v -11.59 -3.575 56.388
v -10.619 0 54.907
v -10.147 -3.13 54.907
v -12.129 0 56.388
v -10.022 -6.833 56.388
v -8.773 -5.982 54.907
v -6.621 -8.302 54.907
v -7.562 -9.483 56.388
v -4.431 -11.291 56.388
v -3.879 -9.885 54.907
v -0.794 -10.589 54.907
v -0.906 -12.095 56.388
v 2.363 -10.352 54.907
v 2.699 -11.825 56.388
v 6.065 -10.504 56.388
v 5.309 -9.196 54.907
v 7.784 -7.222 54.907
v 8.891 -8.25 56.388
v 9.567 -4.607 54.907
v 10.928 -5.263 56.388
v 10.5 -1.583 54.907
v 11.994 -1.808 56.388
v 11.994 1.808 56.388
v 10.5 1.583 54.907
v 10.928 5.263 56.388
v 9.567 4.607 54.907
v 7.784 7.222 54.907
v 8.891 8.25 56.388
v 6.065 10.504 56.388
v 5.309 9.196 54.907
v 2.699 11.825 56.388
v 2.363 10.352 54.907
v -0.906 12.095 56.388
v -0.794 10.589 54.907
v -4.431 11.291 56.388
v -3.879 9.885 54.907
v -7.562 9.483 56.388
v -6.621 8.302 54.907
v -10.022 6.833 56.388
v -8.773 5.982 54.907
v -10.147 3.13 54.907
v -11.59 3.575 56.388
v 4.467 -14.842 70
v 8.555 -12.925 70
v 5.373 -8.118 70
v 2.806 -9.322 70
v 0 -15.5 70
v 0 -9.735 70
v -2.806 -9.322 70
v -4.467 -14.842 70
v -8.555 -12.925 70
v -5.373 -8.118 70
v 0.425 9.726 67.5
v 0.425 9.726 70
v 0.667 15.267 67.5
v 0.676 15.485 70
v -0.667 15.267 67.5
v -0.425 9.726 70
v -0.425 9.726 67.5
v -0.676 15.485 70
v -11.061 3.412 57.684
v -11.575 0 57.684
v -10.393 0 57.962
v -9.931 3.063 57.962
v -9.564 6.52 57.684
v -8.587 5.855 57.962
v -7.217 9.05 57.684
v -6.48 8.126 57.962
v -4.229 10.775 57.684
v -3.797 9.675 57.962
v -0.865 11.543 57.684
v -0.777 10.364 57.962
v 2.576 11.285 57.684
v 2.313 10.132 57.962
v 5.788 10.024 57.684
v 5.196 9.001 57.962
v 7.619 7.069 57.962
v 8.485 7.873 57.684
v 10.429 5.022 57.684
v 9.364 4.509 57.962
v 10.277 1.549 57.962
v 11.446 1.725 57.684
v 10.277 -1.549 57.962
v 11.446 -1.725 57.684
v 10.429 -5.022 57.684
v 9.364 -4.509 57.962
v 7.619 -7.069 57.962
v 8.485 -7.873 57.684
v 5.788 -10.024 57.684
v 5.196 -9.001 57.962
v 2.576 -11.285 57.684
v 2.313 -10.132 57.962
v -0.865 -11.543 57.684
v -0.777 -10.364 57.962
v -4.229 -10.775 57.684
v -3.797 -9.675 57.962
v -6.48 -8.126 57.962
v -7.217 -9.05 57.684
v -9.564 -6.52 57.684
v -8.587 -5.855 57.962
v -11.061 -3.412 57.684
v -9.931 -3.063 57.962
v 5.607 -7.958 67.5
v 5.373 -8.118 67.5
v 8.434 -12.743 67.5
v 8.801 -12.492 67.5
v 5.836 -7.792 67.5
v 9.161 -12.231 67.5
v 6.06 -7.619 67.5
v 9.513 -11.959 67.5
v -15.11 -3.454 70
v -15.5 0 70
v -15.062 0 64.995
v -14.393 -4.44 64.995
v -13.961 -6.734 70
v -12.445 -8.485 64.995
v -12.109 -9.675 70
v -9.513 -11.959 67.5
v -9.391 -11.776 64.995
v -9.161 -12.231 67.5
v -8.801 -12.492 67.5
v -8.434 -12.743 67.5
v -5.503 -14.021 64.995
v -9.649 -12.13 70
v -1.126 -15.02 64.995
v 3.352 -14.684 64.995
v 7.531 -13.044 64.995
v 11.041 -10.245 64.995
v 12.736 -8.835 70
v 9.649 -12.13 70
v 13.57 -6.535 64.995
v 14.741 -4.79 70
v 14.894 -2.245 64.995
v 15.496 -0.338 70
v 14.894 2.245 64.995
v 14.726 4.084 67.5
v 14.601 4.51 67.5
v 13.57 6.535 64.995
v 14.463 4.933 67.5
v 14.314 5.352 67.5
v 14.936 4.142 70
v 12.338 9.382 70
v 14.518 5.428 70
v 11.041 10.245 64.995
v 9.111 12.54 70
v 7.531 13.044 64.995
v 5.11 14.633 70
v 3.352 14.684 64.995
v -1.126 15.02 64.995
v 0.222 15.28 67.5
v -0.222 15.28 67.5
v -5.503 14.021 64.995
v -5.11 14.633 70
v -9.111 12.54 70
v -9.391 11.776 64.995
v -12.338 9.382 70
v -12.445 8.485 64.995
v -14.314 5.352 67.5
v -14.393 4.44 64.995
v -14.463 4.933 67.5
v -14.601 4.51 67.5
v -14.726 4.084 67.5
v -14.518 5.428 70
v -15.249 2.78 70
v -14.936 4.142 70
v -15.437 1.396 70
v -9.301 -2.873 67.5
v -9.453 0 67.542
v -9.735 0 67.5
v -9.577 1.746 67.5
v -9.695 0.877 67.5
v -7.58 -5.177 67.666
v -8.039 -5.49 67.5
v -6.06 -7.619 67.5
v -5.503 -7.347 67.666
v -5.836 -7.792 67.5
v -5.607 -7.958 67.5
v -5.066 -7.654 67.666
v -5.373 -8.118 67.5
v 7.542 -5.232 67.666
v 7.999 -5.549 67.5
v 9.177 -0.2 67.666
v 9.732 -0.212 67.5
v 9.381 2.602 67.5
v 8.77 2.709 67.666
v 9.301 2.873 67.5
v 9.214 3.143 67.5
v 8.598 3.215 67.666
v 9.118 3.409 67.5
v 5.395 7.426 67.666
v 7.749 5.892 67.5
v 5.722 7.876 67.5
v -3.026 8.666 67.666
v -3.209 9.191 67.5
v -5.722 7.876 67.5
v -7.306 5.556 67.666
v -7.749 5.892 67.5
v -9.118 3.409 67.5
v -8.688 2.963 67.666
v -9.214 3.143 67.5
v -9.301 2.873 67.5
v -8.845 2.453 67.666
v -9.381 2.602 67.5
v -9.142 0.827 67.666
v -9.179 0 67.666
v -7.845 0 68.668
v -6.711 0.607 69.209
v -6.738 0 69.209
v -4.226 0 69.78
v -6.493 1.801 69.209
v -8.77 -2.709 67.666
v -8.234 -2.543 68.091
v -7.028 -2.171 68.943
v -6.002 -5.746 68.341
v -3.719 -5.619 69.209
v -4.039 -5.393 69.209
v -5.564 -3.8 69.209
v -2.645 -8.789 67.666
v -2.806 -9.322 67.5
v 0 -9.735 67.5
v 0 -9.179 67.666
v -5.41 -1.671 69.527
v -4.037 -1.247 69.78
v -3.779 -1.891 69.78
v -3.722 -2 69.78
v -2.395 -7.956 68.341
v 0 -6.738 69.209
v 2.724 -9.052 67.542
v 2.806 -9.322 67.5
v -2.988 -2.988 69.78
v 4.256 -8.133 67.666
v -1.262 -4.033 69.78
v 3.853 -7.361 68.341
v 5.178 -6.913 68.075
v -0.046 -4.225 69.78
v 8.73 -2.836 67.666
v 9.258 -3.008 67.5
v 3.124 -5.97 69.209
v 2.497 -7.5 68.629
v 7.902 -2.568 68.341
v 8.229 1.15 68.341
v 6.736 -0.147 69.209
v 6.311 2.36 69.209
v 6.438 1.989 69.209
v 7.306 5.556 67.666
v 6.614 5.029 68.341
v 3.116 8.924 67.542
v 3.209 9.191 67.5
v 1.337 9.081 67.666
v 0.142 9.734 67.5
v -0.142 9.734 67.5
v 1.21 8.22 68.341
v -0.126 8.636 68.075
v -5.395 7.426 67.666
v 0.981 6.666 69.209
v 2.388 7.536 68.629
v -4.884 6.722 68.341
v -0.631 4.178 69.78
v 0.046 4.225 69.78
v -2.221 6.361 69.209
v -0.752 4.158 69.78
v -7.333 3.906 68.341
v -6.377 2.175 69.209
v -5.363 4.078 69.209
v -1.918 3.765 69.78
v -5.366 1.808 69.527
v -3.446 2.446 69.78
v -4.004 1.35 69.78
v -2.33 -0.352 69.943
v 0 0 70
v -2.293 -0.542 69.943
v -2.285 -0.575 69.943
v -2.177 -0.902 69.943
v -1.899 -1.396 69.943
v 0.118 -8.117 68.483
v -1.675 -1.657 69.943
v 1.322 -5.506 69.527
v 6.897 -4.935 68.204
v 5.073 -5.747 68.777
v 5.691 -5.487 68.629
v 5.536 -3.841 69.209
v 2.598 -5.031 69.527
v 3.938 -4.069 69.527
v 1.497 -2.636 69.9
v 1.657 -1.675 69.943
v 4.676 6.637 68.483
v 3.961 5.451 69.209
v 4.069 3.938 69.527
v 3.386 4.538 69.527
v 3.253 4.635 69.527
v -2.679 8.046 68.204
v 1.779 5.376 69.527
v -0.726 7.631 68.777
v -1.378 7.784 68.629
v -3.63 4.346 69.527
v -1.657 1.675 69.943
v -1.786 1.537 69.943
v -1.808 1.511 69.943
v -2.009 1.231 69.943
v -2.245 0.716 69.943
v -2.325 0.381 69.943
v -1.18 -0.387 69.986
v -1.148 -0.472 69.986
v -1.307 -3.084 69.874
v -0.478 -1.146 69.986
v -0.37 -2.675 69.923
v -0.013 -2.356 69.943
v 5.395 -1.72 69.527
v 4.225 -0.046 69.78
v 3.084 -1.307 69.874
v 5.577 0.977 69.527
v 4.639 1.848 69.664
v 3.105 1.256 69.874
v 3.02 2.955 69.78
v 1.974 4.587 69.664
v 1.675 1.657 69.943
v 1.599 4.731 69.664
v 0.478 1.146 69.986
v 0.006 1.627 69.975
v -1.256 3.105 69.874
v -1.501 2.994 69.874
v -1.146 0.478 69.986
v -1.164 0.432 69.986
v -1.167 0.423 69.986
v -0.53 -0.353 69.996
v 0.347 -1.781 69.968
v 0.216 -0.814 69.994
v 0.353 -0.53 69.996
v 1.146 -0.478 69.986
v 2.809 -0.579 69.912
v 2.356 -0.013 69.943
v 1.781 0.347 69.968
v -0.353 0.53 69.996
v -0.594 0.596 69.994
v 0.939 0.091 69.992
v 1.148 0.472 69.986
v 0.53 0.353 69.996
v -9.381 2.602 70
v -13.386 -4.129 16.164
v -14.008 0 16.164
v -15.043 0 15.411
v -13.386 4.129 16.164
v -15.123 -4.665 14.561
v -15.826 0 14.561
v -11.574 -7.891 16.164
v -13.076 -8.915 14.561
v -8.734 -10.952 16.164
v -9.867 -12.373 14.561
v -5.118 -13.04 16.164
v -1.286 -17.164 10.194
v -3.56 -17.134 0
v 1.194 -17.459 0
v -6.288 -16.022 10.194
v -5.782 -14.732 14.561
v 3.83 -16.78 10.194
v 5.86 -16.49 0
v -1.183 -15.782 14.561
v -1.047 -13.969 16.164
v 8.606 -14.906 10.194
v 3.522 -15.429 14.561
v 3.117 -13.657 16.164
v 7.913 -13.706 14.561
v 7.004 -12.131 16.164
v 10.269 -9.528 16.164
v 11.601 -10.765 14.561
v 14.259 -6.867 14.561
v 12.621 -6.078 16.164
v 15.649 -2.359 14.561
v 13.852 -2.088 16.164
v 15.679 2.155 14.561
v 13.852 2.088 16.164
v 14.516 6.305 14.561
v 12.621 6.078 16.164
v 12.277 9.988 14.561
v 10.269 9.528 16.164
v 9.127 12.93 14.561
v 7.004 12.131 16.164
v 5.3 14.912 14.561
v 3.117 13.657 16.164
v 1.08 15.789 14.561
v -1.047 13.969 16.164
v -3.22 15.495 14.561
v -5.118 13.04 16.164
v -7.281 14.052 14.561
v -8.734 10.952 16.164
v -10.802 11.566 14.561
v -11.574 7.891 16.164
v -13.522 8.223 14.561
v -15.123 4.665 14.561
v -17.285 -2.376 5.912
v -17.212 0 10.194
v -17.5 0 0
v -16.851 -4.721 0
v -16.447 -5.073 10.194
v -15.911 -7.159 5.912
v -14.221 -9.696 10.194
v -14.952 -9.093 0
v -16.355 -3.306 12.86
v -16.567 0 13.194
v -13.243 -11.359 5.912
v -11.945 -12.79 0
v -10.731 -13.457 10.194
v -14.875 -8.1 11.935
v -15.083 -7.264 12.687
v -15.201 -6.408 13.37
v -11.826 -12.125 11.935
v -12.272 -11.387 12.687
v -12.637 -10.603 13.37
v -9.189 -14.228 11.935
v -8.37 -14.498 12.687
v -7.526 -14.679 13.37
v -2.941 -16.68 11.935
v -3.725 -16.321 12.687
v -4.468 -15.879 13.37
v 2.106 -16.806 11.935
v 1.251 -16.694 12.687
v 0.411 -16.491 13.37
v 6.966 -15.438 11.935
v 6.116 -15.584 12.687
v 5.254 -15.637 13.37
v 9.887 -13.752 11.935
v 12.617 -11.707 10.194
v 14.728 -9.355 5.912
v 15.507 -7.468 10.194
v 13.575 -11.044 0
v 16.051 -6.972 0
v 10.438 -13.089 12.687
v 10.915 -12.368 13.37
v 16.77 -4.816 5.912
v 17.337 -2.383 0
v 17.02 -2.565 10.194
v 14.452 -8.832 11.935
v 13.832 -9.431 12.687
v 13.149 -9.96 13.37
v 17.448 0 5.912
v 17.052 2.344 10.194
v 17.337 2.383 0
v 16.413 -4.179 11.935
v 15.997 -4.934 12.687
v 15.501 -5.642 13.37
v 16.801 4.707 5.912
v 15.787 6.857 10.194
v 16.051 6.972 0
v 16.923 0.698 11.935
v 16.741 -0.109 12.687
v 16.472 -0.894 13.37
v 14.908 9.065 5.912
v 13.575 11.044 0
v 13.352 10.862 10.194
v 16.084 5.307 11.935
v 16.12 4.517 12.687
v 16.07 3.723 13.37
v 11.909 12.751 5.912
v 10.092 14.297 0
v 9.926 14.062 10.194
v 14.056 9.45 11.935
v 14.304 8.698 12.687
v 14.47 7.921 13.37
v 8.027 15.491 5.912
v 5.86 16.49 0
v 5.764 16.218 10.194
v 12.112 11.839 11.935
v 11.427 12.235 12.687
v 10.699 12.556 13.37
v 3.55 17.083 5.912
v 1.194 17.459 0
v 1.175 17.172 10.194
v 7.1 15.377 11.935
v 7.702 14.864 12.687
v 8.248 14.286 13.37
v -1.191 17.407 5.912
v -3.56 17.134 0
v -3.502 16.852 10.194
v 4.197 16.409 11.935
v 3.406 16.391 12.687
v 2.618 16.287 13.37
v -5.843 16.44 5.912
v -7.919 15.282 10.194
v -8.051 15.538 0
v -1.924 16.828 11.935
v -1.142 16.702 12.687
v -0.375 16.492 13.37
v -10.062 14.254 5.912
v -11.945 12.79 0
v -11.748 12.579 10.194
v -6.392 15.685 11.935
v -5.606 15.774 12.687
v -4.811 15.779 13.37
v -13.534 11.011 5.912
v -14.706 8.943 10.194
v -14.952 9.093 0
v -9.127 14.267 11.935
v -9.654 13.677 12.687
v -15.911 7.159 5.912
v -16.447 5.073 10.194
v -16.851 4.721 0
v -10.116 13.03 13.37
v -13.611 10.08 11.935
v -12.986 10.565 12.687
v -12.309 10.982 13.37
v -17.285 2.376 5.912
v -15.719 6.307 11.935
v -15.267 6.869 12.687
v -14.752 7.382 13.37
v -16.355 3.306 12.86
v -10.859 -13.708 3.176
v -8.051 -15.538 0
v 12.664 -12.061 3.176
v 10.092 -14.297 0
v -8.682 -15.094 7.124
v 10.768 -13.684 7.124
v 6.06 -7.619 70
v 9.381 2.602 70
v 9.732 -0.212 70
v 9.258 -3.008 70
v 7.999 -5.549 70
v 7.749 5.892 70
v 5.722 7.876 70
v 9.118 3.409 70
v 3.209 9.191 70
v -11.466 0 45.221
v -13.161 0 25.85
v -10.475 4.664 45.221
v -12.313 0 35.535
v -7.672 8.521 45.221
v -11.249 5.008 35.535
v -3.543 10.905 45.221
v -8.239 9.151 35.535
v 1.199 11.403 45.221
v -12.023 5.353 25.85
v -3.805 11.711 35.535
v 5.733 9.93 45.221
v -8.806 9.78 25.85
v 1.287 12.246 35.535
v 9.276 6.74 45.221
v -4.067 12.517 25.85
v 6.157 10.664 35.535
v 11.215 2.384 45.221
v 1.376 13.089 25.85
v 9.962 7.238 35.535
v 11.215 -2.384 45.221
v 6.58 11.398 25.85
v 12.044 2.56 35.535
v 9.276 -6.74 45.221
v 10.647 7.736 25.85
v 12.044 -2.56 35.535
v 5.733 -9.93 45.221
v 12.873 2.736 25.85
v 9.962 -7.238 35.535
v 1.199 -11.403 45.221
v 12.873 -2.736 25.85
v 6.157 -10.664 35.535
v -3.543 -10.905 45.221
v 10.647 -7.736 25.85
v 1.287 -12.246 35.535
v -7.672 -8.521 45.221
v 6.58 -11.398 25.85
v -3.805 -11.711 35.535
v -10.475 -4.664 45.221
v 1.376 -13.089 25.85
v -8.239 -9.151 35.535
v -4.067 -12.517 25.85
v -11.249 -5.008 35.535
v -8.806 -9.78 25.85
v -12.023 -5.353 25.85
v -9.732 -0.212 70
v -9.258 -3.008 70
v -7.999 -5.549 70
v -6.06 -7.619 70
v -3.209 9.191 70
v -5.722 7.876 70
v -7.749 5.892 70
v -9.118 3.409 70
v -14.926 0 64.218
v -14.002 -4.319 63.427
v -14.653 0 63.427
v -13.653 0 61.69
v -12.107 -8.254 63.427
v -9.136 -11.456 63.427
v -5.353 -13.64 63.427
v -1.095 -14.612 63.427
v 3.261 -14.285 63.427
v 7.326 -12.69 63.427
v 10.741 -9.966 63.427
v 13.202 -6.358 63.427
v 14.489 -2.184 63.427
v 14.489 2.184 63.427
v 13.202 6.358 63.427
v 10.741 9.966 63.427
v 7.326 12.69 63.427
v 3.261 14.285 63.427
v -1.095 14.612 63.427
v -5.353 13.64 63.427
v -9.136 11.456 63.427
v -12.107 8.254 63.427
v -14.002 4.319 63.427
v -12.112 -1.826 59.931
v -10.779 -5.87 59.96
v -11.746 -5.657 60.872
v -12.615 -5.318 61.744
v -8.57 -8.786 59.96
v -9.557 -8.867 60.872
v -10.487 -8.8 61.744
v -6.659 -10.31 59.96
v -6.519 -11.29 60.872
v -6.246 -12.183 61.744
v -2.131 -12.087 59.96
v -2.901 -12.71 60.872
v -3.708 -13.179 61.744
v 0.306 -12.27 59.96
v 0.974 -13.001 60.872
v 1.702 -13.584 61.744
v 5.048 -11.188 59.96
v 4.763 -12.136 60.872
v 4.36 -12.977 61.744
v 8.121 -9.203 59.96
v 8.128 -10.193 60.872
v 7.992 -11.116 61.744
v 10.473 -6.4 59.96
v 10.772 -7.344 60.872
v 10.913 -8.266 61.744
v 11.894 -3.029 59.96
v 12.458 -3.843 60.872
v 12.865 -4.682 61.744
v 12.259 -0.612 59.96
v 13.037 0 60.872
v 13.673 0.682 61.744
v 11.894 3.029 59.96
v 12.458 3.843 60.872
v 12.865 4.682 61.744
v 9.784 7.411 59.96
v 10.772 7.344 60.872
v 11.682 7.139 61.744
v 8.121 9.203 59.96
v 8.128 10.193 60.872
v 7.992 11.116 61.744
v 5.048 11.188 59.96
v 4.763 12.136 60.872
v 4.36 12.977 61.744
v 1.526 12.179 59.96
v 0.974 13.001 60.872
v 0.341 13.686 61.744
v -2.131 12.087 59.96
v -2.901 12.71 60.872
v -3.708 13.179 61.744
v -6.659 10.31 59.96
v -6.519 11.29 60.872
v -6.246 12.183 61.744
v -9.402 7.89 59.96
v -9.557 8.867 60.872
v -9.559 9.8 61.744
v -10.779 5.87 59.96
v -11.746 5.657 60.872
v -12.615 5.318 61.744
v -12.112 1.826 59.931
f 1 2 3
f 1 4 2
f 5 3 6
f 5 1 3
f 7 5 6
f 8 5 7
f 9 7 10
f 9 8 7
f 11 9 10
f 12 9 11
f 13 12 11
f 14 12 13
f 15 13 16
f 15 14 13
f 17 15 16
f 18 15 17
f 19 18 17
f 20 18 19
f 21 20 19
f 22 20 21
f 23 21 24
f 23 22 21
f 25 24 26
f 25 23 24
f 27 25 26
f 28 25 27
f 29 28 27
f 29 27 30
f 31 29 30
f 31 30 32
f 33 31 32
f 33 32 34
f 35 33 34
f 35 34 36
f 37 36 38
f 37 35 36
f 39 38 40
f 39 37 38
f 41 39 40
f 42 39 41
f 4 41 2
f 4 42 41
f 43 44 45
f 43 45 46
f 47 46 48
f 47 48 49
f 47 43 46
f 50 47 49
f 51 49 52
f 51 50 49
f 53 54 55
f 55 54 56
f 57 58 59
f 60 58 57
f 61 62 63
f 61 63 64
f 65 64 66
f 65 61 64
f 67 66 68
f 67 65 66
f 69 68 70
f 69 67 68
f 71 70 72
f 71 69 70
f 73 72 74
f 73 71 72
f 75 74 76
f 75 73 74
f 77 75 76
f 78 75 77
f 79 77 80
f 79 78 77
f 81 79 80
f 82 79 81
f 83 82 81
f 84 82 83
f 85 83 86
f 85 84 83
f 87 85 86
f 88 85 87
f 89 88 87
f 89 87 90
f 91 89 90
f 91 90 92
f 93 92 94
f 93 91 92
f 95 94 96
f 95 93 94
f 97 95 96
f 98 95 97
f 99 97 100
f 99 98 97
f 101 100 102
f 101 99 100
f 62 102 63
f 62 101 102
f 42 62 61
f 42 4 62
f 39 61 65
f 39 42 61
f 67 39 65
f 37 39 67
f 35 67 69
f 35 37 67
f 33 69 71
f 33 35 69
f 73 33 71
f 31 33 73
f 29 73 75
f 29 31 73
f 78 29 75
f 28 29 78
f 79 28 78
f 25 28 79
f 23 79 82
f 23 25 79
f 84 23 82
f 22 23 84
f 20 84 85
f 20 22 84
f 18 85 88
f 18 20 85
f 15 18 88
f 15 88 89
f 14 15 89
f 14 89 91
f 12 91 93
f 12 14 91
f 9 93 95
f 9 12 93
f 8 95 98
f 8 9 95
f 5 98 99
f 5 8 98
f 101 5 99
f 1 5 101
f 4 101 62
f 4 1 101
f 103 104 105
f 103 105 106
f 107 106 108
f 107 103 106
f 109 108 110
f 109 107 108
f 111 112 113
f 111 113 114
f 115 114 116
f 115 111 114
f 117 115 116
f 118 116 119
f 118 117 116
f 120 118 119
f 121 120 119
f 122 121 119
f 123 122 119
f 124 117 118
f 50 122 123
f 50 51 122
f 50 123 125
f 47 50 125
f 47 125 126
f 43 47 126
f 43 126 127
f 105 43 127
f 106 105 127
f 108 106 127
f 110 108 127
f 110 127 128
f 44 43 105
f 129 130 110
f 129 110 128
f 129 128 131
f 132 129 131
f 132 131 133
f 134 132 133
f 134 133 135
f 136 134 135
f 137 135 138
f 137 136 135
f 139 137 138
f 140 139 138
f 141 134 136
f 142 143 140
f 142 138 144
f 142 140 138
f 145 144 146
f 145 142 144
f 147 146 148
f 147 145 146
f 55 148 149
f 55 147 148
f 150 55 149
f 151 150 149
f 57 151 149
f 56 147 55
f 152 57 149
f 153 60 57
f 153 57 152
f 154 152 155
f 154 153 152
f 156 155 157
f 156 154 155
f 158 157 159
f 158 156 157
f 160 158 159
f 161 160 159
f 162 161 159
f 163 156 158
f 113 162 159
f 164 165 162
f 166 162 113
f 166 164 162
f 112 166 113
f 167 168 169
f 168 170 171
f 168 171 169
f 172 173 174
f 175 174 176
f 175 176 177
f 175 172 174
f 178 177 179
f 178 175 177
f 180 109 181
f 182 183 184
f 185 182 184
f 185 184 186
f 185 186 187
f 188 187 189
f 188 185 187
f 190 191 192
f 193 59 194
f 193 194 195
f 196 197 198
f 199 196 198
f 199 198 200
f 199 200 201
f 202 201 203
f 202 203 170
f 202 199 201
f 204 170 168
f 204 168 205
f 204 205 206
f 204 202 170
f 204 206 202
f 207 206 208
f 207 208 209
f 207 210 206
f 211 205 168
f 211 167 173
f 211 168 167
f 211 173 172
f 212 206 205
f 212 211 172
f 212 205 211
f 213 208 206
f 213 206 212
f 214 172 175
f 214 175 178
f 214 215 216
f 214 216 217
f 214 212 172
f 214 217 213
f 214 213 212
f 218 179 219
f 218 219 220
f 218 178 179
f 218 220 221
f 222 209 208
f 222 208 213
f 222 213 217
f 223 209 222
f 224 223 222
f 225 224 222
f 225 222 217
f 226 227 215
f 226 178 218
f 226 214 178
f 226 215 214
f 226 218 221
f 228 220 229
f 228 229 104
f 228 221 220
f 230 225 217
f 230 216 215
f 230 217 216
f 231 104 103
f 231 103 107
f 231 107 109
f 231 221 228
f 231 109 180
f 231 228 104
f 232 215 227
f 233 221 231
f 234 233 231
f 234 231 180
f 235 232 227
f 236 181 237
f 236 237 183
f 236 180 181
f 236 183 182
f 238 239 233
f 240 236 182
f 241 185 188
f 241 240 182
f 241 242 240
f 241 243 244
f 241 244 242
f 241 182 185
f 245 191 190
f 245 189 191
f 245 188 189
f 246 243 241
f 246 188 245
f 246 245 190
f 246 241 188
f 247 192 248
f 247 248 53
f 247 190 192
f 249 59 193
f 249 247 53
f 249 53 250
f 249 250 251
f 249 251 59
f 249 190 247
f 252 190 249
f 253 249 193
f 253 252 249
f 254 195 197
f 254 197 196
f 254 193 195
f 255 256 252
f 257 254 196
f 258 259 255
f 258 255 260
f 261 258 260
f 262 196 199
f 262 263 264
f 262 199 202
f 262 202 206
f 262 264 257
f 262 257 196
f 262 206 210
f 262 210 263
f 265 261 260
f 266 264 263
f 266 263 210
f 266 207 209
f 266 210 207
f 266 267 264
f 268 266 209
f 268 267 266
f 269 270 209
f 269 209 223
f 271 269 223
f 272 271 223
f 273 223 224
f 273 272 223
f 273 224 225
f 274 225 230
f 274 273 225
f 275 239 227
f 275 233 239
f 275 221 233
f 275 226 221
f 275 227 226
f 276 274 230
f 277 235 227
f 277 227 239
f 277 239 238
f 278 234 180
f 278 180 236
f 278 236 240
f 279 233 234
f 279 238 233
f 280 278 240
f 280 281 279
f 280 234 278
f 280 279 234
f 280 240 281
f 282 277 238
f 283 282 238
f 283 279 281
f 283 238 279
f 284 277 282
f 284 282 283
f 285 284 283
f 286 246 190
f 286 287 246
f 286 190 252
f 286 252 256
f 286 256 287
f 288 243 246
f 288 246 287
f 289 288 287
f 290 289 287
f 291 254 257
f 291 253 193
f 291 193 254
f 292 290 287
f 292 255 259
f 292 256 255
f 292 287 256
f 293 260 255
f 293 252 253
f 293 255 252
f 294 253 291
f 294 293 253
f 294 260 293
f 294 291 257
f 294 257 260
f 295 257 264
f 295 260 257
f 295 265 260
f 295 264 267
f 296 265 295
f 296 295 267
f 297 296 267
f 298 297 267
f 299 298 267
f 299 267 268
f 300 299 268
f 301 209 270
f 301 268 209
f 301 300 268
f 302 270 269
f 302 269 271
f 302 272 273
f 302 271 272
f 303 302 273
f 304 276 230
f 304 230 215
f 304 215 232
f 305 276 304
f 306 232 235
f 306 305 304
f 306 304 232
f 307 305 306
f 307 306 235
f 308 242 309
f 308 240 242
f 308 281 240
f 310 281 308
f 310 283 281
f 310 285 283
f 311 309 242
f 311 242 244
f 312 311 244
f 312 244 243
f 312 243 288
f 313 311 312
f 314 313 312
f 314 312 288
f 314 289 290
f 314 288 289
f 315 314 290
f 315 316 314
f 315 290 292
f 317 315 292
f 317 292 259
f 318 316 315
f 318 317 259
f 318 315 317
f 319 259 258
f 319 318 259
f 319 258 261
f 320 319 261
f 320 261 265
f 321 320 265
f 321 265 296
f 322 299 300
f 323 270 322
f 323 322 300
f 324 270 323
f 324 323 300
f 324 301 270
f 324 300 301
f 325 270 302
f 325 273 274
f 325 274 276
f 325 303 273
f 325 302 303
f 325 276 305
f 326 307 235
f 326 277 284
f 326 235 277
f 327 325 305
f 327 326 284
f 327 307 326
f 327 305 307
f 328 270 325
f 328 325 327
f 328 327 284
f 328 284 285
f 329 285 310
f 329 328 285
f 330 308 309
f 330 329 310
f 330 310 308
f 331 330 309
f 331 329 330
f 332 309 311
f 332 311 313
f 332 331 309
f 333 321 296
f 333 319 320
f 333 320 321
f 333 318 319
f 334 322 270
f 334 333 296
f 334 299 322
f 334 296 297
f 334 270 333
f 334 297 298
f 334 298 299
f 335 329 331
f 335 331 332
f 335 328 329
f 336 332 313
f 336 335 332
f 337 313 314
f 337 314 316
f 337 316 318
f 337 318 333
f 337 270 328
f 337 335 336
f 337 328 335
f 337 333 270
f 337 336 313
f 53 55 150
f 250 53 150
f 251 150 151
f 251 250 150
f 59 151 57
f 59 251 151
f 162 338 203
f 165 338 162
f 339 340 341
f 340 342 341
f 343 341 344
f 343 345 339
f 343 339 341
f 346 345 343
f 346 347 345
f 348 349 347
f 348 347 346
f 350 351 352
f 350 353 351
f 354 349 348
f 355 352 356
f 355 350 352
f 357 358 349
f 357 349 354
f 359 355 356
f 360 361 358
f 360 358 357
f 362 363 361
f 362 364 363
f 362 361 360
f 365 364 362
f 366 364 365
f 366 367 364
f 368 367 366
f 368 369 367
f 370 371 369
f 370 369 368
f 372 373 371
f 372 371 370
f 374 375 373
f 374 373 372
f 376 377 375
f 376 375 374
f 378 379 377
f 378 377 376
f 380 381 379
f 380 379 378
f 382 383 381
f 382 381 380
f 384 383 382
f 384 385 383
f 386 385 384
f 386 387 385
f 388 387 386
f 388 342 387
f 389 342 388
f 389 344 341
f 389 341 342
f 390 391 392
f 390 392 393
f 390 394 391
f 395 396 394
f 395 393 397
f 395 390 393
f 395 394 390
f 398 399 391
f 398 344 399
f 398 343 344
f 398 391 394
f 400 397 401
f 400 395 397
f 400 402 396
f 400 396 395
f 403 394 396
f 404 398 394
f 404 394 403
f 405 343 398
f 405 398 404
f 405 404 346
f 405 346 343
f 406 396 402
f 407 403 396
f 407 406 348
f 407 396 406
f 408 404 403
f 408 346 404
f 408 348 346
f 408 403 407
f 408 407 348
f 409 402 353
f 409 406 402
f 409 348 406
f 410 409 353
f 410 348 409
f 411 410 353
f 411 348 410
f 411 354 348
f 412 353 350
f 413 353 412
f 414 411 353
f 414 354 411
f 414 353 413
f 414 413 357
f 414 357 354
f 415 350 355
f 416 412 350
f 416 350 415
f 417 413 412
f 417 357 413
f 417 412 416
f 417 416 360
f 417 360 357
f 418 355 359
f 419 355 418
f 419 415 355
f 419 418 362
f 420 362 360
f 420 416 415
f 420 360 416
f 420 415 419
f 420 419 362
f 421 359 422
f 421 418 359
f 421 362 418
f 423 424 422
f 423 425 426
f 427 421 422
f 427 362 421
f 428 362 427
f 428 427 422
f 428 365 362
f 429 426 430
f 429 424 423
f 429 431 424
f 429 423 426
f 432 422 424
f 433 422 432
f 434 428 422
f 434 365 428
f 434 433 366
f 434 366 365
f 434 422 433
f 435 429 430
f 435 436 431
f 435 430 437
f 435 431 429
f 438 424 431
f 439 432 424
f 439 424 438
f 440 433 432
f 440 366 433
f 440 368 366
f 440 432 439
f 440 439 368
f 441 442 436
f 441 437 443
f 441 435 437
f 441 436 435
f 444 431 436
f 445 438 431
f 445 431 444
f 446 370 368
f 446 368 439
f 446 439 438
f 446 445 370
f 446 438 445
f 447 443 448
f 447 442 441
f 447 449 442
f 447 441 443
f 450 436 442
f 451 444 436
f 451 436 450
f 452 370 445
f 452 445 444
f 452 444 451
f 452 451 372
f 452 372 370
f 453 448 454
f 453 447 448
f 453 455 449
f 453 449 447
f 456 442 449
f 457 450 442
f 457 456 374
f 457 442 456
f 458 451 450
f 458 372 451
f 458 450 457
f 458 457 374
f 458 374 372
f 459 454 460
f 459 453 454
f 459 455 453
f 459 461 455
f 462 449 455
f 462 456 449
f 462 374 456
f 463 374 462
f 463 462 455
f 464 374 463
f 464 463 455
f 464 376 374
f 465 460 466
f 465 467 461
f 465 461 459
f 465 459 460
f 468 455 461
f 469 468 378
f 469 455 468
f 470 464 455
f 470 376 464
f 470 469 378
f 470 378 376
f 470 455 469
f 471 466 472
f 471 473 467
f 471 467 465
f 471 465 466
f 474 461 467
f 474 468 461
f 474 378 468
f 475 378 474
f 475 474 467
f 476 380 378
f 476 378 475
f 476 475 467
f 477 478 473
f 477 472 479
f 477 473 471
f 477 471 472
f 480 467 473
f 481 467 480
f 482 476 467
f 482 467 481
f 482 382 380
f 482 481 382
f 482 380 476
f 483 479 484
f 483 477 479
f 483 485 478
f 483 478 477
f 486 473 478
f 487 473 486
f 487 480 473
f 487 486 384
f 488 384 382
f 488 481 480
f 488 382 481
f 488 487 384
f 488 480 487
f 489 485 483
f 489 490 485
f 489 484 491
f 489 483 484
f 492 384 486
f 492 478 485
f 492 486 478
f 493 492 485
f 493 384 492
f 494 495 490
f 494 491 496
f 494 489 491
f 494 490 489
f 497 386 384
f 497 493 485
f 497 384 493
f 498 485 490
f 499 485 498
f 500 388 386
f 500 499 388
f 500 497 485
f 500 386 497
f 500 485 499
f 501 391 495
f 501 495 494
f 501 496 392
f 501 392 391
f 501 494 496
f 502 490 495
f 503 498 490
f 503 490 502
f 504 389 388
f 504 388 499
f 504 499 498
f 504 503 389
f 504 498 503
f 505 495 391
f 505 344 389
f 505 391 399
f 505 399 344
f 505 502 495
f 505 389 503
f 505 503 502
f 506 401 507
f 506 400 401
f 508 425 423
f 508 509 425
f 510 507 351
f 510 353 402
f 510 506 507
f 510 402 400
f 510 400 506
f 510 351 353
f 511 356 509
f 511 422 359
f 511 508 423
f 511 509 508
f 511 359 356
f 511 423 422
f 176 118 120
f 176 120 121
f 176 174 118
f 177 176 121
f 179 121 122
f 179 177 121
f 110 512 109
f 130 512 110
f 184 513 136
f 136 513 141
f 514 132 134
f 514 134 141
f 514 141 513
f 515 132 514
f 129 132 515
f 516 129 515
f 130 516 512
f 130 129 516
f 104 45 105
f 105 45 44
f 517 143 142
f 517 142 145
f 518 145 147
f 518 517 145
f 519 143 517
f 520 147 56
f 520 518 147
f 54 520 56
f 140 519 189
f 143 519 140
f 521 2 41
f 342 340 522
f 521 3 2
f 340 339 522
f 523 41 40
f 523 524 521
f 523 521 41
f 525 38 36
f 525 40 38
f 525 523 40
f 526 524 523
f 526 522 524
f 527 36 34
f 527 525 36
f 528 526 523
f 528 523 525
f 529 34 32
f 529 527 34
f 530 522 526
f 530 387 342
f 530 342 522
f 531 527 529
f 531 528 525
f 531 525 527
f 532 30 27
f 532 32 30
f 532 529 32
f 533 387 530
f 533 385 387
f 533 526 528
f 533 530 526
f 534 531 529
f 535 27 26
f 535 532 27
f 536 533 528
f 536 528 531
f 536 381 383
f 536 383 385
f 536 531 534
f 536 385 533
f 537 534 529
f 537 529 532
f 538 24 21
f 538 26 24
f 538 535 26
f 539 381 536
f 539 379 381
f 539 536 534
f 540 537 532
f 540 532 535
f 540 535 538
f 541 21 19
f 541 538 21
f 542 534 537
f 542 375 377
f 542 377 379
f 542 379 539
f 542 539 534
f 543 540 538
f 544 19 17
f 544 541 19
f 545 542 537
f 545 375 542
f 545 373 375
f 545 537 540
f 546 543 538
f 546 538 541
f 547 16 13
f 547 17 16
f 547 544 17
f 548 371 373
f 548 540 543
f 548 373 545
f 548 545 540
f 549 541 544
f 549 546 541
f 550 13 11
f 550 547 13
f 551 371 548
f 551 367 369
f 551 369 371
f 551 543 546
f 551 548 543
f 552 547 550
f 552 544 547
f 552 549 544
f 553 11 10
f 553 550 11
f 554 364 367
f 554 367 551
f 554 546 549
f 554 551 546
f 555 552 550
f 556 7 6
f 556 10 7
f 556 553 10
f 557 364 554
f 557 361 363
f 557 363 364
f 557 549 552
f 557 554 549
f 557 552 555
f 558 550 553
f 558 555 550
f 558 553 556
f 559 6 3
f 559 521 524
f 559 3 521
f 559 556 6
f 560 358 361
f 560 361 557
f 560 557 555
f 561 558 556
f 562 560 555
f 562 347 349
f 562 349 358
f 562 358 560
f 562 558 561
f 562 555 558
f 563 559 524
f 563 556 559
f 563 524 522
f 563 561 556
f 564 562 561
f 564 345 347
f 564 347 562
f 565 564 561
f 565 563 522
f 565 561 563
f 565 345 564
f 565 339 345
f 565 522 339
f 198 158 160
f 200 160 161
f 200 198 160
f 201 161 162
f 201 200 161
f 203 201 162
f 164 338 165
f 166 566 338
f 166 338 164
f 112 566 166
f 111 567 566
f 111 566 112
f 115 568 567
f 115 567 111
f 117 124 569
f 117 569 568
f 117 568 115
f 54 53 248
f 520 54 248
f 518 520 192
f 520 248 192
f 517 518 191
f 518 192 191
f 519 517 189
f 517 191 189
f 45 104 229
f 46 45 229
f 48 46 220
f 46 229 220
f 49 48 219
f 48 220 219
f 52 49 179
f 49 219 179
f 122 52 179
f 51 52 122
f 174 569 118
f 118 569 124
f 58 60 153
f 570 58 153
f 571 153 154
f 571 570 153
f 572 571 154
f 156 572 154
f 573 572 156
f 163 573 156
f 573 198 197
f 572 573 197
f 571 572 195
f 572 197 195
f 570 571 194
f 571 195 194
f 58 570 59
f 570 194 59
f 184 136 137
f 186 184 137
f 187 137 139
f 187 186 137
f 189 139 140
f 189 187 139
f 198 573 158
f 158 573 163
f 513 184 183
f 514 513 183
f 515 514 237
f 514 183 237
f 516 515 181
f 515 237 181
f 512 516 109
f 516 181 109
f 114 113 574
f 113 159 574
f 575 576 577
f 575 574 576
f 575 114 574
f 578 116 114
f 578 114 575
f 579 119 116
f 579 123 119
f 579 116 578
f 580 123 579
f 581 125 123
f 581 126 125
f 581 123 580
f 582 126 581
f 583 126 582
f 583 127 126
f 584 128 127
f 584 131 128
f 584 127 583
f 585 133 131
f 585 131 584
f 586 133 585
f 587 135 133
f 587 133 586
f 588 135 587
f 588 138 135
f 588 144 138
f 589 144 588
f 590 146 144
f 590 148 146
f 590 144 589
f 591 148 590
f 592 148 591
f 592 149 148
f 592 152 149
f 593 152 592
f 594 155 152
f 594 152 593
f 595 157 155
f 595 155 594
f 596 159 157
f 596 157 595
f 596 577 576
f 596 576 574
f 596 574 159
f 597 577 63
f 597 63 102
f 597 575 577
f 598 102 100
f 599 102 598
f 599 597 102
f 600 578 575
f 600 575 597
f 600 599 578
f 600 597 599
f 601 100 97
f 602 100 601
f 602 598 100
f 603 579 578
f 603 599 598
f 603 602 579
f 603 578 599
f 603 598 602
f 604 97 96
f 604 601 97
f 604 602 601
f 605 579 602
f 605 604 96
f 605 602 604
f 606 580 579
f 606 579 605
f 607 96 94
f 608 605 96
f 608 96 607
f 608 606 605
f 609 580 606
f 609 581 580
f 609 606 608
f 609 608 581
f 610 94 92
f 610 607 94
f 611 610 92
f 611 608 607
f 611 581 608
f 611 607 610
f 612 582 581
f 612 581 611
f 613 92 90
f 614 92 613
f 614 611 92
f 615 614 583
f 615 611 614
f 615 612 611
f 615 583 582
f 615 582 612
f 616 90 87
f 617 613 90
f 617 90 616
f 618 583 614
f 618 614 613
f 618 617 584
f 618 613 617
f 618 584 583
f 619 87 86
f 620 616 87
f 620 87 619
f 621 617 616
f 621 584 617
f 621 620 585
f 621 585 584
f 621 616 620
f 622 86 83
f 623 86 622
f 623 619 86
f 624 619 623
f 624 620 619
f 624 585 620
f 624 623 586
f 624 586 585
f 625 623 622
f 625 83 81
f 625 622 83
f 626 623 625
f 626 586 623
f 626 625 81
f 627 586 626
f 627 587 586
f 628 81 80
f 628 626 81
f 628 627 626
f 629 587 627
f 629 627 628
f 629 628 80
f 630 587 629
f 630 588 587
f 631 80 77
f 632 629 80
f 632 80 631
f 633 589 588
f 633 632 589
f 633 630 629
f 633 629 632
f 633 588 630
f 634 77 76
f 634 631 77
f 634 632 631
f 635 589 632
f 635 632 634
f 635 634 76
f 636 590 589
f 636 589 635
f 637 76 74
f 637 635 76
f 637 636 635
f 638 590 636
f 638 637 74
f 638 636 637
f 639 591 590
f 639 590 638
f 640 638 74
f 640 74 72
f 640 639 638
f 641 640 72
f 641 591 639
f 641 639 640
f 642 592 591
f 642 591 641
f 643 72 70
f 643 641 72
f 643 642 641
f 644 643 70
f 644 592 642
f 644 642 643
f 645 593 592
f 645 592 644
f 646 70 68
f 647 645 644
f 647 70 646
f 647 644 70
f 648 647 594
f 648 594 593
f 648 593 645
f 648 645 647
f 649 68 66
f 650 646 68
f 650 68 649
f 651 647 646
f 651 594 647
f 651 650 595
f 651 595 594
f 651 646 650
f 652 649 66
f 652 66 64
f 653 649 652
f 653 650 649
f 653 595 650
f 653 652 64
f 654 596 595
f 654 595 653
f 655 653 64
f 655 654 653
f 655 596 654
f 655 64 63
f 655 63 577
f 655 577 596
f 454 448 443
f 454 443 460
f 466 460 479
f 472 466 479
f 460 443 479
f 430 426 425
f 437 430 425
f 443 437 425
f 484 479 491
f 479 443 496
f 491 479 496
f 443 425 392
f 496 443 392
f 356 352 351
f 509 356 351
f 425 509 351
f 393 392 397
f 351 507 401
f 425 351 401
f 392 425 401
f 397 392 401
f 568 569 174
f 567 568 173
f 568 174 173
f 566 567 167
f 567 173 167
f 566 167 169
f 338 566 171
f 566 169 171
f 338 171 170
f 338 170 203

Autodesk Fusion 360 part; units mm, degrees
sketch "Sketch1" plane through (0, 0, 0) normal (0, 1, 0) x (1, 0, 0)
  line L0 (0, 0) -> (0, -70)
  line L1 (0, 0) -> (-17.5, 0)
  spline S0 degree 5 poles (-17.5, 0) (-17.5, -1.949) (-17.4812, -5.4749) (-17.3967, -9.6483) (-17.034, -13.32) (-15.2217, -16.0242) (-11.5143, -17.5778) (-6.6893, -18.7492) (-2.4074, -19.5755) (0, -20) knots 0 0 0 0 0 0 0.2 0.4 0.6 0.8 1 1 1 1 1 1
  line L2 (-5, -19.1184) -> (5, -20.8816)
  line L3 (-17.5, 4) -> (-17.5, -4)
  line L4 (-15.4223, 0) -> (-10.3547, -57.9233)
  spline S1 degree 5 poles (-10.3547, -57.9233) (-10.6938, -58.2624) (-11.3394, -58.9222) (-12.2103, -59.8566) (-13.1936, -61.0089) (-14.1589, -62.3571) (-14.7035, -63.4078) (-14.9524, -64.1982) (-15.0388, -64.7286) (-15.0621, -64.9946) knots 0 0 0 0 0 0 0.2 0.4 0.6 0.8 1 1 1 1 1 1
  line L5 (-15.0621, -64.9946) -> (-15.5, -70)
  line L6 (-14.9783, -64.0369) -> (-15.1459, -65.9522)
  line L7 (-17.5, -70) -> (0, -70) construction
  line L8 (-15.5, -70) -> (-9.7348, -70)
  line L9 (-9.7348, -70) -> (-9.7348, -67.5)
  line L10 (-9.0716, -56.6402) -> (-11.6378, -59.2064)
  line L11 (-17.5, 0) -> (-17.5, -70) construction
  spline S2 degree 5 poles (-9.7348, -67.5) (-9.5938, -67.5) (-9.3202, -67.5511) (-8.9352, -67.7806) (-8.3991, -68.3325) (-7.2315, -69.1675) (-5.359, -69.7194) (-3.0799, -69.9489) (-1.103, -70) (0, -70) knots 0 0 0 0 0 0 0.2 0.4 0.6 0.8 1 1 1 1 1 1
  line L12 (-10.1589, -67.5) -> (-9.3107, -67.5)
  line L13 (-3.3162, -70) -> (3.3162, -70)
  line L14 (-10.3504, -57.9716) -> (-11.575, -57.6845)
  line L15 (-12.1293, -56.3884) -> (-10.6186, -54.9071)
  line L16 (-11.575, -57.6845) -> (-12.1293, -56.3884)
  dimension "d1" = 70
  dimension "d2" = 17.5
  dimension "d3" = 5
  dimension "d4" = 45
  dimension "d5" = 5
  dimension "d6" = 10
  dimension "d14" = 2.5
  dimension "d15" = 2
revolve "Revolve1" add sketch "Sketch1" angle 360 about axis through (0, 0, 0) along (0, 0, 1)
sketch "Sketch3" plane through (0, 0, 70) normal (0, 0, 1) x (-1, 0, 0)
  circle A0 centre (0, 0) radius 9.7348
  circle A1 centre (0, 0) radius 15.5
  line L0 (0, 0) -> (0.6761, -15.4852)
  line L1 (0, 0) -> (-0.6761, -15.4852)
  line L2 (0, 0) -> (0, -15.5) construction
  dimension "d8" = 5
  dimension "d9" = 2.5
extrude "Extrude1" cut sketch "Sketch3" against normal up to surface (2.5 mm away) contours A0 A1 L0 L1 picked at (0.4421, -13.5697)
pattern_circular "C-Pattern1" count 5 over 360 about axis through (0, 0, 1.75) along (0, 0, 1) of "Extrude1"
equation "d2 = 3.5 cm / 2"
